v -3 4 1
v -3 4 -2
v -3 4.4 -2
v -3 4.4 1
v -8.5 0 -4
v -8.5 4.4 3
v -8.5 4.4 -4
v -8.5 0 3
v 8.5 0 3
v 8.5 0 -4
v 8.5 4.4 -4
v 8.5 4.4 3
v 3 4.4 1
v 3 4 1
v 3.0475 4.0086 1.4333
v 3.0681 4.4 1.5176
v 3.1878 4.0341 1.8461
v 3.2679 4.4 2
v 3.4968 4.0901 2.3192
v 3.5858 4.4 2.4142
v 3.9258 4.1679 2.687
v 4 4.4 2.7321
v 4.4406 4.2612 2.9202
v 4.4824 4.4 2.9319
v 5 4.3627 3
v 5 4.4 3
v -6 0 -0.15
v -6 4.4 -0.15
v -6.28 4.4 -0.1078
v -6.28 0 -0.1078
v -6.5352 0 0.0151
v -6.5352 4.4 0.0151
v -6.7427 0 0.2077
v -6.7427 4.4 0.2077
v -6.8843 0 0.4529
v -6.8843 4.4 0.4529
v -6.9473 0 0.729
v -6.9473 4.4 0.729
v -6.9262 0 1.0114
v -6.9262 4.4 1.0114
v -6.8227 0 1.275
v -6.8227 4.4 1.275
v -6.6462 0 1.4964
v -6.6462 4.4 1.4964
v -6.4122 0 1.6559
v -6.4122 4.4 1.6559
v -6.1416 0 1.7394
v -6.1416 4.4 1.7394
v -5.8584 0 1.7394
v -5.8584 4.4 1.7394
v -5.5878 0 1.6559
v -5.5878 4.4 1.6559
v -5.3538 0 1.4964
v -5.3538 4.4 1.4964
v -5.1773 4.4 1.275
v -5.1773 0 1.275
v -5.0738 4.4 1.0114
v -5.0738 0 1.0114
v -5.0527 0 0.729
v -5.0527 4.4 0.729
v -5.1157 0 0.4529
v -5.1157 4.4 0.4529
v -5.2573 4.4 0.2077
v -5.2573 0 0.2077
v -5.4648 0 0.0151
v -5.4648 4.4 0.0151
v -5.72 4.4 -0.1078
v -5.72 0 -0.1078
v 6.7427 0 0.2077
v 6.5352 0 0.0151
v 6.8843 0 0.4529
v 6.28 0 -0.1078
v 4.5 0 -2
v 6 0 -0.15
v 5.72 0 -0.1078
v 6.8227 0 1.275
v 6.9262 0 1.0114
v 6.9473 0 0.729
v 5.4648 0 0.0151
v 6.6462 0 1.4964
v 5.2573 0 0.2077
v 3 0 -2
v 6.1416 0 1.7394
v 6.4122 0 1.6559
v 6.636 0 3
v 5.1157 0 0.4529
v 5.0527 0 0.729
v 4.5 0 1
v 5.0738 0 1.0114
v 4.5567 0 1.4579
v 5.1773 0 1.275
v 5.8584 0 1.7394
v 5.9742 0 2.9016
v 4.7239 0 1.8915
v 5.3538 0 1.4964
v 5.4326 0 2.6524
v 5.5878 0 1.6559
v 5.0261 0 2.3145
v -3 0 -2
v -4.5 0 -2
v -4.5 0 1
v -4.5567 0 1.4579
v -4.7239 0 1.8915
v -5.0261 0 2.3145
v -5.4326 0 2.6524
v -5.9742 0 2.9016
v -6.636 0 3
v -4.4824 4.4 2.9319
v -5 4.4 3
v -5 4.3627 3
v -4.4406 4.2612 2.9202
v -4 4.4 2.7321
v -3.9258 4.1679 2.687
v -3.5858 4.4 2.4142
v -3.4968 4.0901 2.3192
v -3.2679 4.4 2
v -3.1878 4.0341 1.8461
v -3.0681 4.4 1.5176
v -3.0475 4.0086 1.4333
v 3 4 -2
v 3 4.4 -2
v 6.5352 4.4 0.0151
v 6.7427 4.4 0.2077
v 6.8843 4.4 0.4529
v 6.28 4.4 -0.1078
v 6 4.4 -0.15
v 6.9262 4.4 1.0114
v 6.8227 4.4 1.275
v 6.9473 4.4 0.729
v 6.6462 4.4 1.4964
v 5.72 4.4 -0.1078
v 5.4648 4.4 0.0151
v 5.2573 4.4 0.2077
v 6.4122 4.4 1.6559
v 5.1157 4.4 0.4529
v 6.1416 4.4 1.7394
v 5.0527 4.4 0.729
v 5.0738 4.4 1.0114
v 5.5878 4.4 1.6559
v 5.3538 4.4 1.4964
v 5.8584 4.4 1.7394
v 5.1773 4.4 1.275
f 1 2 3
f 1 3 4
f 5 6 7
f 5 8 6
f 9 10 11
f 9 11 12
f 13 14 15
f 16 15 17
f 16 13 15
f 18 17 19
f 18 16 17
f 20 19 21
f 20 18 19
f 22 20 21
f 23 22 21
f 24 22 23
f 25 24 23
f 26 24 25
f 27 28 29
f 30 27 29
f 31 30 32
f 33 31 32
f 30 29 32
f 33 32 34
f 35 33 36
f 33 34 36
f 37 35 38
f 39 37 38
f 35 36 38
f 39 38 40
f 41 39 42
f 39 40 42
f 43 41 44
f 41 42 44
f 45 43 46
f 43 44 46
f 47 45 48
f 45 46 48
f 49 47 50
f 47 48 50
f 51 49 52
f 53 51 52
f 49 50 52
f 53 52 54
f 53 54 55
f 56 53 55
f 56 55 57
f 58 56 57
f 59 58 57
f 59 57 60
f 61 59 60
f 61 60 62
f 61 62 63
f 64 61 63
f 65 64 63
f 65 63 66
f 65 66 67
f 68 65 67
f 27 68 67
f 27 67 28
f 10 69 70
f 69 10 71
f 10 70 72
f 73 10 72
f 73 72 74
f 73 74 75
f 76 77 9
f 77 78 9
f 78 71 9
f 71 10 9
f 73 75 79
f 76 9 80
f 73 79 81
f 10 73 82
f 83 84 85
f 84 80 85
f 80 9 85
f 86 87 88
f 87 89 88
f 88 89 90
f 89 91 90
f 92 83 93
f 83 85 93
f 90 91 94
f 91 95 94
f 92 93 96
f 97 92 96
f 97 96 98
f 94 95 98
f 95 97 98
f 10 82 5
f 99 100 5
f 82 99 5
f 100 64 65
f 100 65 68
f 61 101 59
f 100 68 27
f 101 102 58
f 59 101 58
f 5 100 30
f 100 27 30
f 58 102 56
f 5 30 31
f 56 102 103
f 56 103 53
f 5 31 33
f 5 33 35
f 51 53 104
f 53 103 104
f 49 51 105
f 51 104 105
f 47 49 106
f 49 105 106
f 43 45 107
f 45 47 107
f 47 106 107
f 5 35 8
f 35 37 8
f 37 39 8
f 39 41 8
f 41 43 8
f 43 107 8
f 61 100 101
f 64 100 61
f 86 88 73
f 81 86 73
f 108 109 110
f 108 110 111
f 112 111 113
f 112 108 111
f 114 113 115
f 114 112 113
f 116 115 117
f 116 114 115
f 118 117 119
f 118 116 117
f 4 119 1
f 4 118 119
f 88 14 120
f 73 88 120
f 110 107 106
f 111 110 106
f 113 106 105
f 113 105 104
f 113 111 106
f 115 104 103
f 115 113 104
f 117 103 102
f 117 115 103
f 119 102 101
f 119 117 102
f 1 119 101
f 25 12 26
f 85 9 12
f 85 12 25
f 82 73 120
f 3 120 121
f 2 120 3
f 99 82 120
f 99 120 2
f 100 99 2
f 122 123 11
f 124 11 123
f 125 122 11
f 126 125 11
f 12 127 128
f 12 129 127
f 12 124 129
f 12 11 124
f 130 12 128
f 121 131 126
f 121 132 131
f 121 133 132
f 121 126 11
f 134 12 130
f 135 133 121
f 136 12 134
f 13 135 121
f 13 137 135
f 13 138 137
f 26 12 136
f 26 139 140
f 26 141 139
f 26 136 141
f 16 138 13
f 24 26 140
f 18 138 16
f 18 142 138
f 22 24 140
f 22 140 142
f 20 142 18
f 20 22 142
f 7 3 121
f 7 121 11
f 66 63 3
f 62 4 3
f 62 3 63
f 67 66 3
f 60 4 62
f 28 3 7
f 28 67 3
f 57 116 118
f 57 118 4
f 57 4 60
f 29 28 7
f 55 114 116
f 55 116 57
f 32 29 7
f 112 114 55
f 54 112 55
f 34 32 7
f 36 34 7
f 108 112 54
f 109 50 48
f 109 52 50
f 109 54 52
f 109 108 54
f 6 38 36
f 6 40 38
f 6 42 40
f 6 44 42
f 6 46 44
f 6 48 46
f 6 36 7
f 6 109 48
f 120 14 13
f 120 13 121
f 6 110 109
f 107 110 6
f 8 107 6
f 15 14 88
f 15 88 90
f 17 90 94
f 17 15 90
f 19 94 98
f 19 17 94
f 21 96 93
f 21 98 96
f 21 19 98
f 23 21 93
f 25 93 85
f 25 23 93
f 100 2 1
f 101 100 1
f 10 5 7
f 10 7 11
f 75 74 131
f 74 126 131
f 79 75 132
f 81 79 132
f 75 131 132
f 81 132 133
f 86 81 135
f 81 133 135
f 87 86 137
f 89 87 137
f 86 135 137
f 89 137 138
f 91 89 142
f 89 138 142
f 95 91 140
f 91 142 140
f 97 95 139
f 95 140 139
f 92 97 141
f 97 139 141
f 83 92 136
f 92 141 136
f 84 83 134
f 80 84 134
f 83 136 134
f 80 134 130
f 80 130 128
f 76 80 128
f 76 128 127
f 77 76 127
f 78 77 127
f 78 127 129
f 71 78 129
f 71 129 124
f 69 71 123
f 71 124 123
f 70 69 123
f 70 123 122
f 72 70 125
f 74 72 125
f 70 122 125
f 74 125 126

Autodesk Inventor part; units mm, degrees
ref_plane "YZ Plane" through (0, 0, 0) normal (1, 0, 0) x (0, 1, 0)
ref_plane "XZ Plane" through (0, 0, 0) normal (0, 1, 0) x (-1, 0, 0)
ref_plane "XY Plane" through (0, 0, 0) normal (0, 0, 1) x (1, 0, 0)
sketch "Skizze1" plane through (0, 0, 0) normal (0, 1, 0) x (-1, 0, 0)
  line L0 (8.5, -4) -> (-8.5, -4)
  line L1 (-8.5, -4) -> (-8.5, 3)
  line L2 (-8.5, 3) -> (8.5, 3)
  line L3 (8.5, 3) -> (8.5, -4)
  line L4 (-11.9, 0) -> (11.9, 0) construction
  line L5 (0, -5.4) -> (0, 4.4) construction
  point P0 (0, 0)
  dimension "d0" = 17
  dimension "d1" = 7
  dimension "d60" = 3
extrude "Extrusion1" add sketch "Skizze1" along normal blind 4.4
sketch "Skizze2" plane through (0, 0, 0) normal (0, -1, 0) x (1, 0, 0)
  line L0 (-11.9, 0) -> (11.9, 0) projected
  line L1 (0, 4.4) -> (0, -5.4) projected
  point P0 (0, 0)
  point P1 (-6, 0.8)
  point P2 (6, 0.8)
  dimension "d5" = 0.8
  dimension "d6" = 6
hole "Bohrung1" at (-6, 0, 0.8) at (6, 0, 0.8) direction (0, 1, 0) diameter 1.9 end through all
sketch "Skizze5" plane through (0, 0, 0) normal (0, -1, 0) x (1, 0, 0)
  line L0 (8.5, -4) -> (-8.5, -4) projected
  line L1 (8.5, 3) -> (8.5, -4) projected
  line L2 (-8.5, -4) -> (8.5, -4)
  line L3 (8.5, -4) -> (8.5, -3)
  line L4 (8.5, -3) -> (-8.5, -3)
  line L5 (-8.5, -3) -> (-8.5, -4)
  point P0 (0, 0)
  dimension "d29" = 1
extrude "Extrusion4" [suppressed]
sketch "Skizze6" plane through (0, 0, 0) normal (0, -1, 0) x (1, 0, 0)
  line L0 (8.5, -4) -> (8.5, 3) projected
  line L1 (8.5, 3) -> (-8.5, 3) projected
  line L2 (-8.5, 3) -> (-8.5, -4) projected
  circle A0 centre (-6, 0.8) radius 0.95 projected
  circle A1 centre (6, 0.8) radius 0.95 projected
  line L3 (8.5, 3) -> (-8.5, 3) projected
  line L4 (-3, 3) -> (3, 3)
  line L5 (3, 3) -> (3, -2)
  line L6 (3, -2) -> (-3, -2)
  line L7 (-3, -2) -> (-3, 3)
  line L8 (0, 4.4) -> (0, -5.4) projected
  line L9 (-8.5, -4) -> (8.5, -4) projected
  point P0 (0, 0)
  point P1 (0, 3)
  dimension "d32" = 6
  dimension "d58" = 2
  dimension "d59" = 2
extrude "Extrusion5" cut sketch "Skizze6" against normal through all contours L5 L6 L8 L1 | L6 L7 L1 L8
sketch "Skizze7" plane through (-8.5, -0.4, -2) normal (0, 0, 1) x (1, 0, 0)
  line L0 (0, 0) -> (1, 0)
  line L1 (1, 0) -> (1, 0.4)
  line L2 (1, 0.4) -> (0, 0.4)
  line L3 (0, 0.4) -> (0, 0)
  line L4 (17, 0) -> (0, 0) projected
  line L5 (11.5, 0.4) -> (17, 0.4) projected
  line L6 (17, 0) -> (16, 0)
  line L7 (16, 0) -> (16, 0.4)
  line L8 (16, 0.4) -> (17, 0.4)
  line L9 (17, 0.4) -> (17, 0)
  point P0 (8.5, 0.4)
  dimension "d35" = 1
  dimension "d36" = 1
extrude "Extrusion6" [suppressed]
chamfer "Fase4" [suppressed]
chamfer "Fase6" distance 1.5 distance2 4 1 edges at (-3, 0, 0.5) measured on face at (1, 0, -3.3333)
chamfer "Fase7" distance 1.5 distance2 4 1 edges at (3, 0, 0.5) measured on face at (1, 0, -3.3333)
fillet "Rundung3" radius 2 4 edges at (-3.75, 2, 3) (-3, 4.2, 3) (3.75, 2, 3) (3, 4.2, 3)
sketch "Skizze8" plane through (0, 0, 0) normal (0, -1, 0) x (1, 0, 0)
  line L0 (-3, 3) -> (-7.5, 3) projected
  line L1 (-7.5, 3) -> (-7.5, -2) projected
  line L2 (-7.5, -2) -> (-3, -2) projected
  line L3 (-3, -2) -> (-3, 3) projected
  circle A0 centre (-6, 1) radius 0.95 projected
  line L4 (3, 3) -> (3, -2) projected
  line L5 (3, -2) -> (7.5, -2) projected
  line L6 (7.5, -2) -> (7.5, 3) projected
  line L7 (7.5, 3) -> (3, 3) projected
  circle A1 centre (6, 1) radius 0.95 projected
  line L8 (-7.5, 3) -> (-7.5, -2) projected
  line L9 (-7.5, -2) -> (-3, -2) projected
  line L10 (-3, -2) -> (-3, 3) projected
  line L11 (-3, 3) -> (-7.5, 3) projected
  line L12 (7.5, -2) -> (7.5, 3) projected
  line L13 (3, 3) -> (3, -2) projected
  line L14 (3, -2) -> (7.5, -2) projected
  line L15 (7.5, 3) -> (3, 3) projected
equation "\"d5\" = d4"
equation "\"d4\" = 0.8"
properties part number "LED Schirm"
